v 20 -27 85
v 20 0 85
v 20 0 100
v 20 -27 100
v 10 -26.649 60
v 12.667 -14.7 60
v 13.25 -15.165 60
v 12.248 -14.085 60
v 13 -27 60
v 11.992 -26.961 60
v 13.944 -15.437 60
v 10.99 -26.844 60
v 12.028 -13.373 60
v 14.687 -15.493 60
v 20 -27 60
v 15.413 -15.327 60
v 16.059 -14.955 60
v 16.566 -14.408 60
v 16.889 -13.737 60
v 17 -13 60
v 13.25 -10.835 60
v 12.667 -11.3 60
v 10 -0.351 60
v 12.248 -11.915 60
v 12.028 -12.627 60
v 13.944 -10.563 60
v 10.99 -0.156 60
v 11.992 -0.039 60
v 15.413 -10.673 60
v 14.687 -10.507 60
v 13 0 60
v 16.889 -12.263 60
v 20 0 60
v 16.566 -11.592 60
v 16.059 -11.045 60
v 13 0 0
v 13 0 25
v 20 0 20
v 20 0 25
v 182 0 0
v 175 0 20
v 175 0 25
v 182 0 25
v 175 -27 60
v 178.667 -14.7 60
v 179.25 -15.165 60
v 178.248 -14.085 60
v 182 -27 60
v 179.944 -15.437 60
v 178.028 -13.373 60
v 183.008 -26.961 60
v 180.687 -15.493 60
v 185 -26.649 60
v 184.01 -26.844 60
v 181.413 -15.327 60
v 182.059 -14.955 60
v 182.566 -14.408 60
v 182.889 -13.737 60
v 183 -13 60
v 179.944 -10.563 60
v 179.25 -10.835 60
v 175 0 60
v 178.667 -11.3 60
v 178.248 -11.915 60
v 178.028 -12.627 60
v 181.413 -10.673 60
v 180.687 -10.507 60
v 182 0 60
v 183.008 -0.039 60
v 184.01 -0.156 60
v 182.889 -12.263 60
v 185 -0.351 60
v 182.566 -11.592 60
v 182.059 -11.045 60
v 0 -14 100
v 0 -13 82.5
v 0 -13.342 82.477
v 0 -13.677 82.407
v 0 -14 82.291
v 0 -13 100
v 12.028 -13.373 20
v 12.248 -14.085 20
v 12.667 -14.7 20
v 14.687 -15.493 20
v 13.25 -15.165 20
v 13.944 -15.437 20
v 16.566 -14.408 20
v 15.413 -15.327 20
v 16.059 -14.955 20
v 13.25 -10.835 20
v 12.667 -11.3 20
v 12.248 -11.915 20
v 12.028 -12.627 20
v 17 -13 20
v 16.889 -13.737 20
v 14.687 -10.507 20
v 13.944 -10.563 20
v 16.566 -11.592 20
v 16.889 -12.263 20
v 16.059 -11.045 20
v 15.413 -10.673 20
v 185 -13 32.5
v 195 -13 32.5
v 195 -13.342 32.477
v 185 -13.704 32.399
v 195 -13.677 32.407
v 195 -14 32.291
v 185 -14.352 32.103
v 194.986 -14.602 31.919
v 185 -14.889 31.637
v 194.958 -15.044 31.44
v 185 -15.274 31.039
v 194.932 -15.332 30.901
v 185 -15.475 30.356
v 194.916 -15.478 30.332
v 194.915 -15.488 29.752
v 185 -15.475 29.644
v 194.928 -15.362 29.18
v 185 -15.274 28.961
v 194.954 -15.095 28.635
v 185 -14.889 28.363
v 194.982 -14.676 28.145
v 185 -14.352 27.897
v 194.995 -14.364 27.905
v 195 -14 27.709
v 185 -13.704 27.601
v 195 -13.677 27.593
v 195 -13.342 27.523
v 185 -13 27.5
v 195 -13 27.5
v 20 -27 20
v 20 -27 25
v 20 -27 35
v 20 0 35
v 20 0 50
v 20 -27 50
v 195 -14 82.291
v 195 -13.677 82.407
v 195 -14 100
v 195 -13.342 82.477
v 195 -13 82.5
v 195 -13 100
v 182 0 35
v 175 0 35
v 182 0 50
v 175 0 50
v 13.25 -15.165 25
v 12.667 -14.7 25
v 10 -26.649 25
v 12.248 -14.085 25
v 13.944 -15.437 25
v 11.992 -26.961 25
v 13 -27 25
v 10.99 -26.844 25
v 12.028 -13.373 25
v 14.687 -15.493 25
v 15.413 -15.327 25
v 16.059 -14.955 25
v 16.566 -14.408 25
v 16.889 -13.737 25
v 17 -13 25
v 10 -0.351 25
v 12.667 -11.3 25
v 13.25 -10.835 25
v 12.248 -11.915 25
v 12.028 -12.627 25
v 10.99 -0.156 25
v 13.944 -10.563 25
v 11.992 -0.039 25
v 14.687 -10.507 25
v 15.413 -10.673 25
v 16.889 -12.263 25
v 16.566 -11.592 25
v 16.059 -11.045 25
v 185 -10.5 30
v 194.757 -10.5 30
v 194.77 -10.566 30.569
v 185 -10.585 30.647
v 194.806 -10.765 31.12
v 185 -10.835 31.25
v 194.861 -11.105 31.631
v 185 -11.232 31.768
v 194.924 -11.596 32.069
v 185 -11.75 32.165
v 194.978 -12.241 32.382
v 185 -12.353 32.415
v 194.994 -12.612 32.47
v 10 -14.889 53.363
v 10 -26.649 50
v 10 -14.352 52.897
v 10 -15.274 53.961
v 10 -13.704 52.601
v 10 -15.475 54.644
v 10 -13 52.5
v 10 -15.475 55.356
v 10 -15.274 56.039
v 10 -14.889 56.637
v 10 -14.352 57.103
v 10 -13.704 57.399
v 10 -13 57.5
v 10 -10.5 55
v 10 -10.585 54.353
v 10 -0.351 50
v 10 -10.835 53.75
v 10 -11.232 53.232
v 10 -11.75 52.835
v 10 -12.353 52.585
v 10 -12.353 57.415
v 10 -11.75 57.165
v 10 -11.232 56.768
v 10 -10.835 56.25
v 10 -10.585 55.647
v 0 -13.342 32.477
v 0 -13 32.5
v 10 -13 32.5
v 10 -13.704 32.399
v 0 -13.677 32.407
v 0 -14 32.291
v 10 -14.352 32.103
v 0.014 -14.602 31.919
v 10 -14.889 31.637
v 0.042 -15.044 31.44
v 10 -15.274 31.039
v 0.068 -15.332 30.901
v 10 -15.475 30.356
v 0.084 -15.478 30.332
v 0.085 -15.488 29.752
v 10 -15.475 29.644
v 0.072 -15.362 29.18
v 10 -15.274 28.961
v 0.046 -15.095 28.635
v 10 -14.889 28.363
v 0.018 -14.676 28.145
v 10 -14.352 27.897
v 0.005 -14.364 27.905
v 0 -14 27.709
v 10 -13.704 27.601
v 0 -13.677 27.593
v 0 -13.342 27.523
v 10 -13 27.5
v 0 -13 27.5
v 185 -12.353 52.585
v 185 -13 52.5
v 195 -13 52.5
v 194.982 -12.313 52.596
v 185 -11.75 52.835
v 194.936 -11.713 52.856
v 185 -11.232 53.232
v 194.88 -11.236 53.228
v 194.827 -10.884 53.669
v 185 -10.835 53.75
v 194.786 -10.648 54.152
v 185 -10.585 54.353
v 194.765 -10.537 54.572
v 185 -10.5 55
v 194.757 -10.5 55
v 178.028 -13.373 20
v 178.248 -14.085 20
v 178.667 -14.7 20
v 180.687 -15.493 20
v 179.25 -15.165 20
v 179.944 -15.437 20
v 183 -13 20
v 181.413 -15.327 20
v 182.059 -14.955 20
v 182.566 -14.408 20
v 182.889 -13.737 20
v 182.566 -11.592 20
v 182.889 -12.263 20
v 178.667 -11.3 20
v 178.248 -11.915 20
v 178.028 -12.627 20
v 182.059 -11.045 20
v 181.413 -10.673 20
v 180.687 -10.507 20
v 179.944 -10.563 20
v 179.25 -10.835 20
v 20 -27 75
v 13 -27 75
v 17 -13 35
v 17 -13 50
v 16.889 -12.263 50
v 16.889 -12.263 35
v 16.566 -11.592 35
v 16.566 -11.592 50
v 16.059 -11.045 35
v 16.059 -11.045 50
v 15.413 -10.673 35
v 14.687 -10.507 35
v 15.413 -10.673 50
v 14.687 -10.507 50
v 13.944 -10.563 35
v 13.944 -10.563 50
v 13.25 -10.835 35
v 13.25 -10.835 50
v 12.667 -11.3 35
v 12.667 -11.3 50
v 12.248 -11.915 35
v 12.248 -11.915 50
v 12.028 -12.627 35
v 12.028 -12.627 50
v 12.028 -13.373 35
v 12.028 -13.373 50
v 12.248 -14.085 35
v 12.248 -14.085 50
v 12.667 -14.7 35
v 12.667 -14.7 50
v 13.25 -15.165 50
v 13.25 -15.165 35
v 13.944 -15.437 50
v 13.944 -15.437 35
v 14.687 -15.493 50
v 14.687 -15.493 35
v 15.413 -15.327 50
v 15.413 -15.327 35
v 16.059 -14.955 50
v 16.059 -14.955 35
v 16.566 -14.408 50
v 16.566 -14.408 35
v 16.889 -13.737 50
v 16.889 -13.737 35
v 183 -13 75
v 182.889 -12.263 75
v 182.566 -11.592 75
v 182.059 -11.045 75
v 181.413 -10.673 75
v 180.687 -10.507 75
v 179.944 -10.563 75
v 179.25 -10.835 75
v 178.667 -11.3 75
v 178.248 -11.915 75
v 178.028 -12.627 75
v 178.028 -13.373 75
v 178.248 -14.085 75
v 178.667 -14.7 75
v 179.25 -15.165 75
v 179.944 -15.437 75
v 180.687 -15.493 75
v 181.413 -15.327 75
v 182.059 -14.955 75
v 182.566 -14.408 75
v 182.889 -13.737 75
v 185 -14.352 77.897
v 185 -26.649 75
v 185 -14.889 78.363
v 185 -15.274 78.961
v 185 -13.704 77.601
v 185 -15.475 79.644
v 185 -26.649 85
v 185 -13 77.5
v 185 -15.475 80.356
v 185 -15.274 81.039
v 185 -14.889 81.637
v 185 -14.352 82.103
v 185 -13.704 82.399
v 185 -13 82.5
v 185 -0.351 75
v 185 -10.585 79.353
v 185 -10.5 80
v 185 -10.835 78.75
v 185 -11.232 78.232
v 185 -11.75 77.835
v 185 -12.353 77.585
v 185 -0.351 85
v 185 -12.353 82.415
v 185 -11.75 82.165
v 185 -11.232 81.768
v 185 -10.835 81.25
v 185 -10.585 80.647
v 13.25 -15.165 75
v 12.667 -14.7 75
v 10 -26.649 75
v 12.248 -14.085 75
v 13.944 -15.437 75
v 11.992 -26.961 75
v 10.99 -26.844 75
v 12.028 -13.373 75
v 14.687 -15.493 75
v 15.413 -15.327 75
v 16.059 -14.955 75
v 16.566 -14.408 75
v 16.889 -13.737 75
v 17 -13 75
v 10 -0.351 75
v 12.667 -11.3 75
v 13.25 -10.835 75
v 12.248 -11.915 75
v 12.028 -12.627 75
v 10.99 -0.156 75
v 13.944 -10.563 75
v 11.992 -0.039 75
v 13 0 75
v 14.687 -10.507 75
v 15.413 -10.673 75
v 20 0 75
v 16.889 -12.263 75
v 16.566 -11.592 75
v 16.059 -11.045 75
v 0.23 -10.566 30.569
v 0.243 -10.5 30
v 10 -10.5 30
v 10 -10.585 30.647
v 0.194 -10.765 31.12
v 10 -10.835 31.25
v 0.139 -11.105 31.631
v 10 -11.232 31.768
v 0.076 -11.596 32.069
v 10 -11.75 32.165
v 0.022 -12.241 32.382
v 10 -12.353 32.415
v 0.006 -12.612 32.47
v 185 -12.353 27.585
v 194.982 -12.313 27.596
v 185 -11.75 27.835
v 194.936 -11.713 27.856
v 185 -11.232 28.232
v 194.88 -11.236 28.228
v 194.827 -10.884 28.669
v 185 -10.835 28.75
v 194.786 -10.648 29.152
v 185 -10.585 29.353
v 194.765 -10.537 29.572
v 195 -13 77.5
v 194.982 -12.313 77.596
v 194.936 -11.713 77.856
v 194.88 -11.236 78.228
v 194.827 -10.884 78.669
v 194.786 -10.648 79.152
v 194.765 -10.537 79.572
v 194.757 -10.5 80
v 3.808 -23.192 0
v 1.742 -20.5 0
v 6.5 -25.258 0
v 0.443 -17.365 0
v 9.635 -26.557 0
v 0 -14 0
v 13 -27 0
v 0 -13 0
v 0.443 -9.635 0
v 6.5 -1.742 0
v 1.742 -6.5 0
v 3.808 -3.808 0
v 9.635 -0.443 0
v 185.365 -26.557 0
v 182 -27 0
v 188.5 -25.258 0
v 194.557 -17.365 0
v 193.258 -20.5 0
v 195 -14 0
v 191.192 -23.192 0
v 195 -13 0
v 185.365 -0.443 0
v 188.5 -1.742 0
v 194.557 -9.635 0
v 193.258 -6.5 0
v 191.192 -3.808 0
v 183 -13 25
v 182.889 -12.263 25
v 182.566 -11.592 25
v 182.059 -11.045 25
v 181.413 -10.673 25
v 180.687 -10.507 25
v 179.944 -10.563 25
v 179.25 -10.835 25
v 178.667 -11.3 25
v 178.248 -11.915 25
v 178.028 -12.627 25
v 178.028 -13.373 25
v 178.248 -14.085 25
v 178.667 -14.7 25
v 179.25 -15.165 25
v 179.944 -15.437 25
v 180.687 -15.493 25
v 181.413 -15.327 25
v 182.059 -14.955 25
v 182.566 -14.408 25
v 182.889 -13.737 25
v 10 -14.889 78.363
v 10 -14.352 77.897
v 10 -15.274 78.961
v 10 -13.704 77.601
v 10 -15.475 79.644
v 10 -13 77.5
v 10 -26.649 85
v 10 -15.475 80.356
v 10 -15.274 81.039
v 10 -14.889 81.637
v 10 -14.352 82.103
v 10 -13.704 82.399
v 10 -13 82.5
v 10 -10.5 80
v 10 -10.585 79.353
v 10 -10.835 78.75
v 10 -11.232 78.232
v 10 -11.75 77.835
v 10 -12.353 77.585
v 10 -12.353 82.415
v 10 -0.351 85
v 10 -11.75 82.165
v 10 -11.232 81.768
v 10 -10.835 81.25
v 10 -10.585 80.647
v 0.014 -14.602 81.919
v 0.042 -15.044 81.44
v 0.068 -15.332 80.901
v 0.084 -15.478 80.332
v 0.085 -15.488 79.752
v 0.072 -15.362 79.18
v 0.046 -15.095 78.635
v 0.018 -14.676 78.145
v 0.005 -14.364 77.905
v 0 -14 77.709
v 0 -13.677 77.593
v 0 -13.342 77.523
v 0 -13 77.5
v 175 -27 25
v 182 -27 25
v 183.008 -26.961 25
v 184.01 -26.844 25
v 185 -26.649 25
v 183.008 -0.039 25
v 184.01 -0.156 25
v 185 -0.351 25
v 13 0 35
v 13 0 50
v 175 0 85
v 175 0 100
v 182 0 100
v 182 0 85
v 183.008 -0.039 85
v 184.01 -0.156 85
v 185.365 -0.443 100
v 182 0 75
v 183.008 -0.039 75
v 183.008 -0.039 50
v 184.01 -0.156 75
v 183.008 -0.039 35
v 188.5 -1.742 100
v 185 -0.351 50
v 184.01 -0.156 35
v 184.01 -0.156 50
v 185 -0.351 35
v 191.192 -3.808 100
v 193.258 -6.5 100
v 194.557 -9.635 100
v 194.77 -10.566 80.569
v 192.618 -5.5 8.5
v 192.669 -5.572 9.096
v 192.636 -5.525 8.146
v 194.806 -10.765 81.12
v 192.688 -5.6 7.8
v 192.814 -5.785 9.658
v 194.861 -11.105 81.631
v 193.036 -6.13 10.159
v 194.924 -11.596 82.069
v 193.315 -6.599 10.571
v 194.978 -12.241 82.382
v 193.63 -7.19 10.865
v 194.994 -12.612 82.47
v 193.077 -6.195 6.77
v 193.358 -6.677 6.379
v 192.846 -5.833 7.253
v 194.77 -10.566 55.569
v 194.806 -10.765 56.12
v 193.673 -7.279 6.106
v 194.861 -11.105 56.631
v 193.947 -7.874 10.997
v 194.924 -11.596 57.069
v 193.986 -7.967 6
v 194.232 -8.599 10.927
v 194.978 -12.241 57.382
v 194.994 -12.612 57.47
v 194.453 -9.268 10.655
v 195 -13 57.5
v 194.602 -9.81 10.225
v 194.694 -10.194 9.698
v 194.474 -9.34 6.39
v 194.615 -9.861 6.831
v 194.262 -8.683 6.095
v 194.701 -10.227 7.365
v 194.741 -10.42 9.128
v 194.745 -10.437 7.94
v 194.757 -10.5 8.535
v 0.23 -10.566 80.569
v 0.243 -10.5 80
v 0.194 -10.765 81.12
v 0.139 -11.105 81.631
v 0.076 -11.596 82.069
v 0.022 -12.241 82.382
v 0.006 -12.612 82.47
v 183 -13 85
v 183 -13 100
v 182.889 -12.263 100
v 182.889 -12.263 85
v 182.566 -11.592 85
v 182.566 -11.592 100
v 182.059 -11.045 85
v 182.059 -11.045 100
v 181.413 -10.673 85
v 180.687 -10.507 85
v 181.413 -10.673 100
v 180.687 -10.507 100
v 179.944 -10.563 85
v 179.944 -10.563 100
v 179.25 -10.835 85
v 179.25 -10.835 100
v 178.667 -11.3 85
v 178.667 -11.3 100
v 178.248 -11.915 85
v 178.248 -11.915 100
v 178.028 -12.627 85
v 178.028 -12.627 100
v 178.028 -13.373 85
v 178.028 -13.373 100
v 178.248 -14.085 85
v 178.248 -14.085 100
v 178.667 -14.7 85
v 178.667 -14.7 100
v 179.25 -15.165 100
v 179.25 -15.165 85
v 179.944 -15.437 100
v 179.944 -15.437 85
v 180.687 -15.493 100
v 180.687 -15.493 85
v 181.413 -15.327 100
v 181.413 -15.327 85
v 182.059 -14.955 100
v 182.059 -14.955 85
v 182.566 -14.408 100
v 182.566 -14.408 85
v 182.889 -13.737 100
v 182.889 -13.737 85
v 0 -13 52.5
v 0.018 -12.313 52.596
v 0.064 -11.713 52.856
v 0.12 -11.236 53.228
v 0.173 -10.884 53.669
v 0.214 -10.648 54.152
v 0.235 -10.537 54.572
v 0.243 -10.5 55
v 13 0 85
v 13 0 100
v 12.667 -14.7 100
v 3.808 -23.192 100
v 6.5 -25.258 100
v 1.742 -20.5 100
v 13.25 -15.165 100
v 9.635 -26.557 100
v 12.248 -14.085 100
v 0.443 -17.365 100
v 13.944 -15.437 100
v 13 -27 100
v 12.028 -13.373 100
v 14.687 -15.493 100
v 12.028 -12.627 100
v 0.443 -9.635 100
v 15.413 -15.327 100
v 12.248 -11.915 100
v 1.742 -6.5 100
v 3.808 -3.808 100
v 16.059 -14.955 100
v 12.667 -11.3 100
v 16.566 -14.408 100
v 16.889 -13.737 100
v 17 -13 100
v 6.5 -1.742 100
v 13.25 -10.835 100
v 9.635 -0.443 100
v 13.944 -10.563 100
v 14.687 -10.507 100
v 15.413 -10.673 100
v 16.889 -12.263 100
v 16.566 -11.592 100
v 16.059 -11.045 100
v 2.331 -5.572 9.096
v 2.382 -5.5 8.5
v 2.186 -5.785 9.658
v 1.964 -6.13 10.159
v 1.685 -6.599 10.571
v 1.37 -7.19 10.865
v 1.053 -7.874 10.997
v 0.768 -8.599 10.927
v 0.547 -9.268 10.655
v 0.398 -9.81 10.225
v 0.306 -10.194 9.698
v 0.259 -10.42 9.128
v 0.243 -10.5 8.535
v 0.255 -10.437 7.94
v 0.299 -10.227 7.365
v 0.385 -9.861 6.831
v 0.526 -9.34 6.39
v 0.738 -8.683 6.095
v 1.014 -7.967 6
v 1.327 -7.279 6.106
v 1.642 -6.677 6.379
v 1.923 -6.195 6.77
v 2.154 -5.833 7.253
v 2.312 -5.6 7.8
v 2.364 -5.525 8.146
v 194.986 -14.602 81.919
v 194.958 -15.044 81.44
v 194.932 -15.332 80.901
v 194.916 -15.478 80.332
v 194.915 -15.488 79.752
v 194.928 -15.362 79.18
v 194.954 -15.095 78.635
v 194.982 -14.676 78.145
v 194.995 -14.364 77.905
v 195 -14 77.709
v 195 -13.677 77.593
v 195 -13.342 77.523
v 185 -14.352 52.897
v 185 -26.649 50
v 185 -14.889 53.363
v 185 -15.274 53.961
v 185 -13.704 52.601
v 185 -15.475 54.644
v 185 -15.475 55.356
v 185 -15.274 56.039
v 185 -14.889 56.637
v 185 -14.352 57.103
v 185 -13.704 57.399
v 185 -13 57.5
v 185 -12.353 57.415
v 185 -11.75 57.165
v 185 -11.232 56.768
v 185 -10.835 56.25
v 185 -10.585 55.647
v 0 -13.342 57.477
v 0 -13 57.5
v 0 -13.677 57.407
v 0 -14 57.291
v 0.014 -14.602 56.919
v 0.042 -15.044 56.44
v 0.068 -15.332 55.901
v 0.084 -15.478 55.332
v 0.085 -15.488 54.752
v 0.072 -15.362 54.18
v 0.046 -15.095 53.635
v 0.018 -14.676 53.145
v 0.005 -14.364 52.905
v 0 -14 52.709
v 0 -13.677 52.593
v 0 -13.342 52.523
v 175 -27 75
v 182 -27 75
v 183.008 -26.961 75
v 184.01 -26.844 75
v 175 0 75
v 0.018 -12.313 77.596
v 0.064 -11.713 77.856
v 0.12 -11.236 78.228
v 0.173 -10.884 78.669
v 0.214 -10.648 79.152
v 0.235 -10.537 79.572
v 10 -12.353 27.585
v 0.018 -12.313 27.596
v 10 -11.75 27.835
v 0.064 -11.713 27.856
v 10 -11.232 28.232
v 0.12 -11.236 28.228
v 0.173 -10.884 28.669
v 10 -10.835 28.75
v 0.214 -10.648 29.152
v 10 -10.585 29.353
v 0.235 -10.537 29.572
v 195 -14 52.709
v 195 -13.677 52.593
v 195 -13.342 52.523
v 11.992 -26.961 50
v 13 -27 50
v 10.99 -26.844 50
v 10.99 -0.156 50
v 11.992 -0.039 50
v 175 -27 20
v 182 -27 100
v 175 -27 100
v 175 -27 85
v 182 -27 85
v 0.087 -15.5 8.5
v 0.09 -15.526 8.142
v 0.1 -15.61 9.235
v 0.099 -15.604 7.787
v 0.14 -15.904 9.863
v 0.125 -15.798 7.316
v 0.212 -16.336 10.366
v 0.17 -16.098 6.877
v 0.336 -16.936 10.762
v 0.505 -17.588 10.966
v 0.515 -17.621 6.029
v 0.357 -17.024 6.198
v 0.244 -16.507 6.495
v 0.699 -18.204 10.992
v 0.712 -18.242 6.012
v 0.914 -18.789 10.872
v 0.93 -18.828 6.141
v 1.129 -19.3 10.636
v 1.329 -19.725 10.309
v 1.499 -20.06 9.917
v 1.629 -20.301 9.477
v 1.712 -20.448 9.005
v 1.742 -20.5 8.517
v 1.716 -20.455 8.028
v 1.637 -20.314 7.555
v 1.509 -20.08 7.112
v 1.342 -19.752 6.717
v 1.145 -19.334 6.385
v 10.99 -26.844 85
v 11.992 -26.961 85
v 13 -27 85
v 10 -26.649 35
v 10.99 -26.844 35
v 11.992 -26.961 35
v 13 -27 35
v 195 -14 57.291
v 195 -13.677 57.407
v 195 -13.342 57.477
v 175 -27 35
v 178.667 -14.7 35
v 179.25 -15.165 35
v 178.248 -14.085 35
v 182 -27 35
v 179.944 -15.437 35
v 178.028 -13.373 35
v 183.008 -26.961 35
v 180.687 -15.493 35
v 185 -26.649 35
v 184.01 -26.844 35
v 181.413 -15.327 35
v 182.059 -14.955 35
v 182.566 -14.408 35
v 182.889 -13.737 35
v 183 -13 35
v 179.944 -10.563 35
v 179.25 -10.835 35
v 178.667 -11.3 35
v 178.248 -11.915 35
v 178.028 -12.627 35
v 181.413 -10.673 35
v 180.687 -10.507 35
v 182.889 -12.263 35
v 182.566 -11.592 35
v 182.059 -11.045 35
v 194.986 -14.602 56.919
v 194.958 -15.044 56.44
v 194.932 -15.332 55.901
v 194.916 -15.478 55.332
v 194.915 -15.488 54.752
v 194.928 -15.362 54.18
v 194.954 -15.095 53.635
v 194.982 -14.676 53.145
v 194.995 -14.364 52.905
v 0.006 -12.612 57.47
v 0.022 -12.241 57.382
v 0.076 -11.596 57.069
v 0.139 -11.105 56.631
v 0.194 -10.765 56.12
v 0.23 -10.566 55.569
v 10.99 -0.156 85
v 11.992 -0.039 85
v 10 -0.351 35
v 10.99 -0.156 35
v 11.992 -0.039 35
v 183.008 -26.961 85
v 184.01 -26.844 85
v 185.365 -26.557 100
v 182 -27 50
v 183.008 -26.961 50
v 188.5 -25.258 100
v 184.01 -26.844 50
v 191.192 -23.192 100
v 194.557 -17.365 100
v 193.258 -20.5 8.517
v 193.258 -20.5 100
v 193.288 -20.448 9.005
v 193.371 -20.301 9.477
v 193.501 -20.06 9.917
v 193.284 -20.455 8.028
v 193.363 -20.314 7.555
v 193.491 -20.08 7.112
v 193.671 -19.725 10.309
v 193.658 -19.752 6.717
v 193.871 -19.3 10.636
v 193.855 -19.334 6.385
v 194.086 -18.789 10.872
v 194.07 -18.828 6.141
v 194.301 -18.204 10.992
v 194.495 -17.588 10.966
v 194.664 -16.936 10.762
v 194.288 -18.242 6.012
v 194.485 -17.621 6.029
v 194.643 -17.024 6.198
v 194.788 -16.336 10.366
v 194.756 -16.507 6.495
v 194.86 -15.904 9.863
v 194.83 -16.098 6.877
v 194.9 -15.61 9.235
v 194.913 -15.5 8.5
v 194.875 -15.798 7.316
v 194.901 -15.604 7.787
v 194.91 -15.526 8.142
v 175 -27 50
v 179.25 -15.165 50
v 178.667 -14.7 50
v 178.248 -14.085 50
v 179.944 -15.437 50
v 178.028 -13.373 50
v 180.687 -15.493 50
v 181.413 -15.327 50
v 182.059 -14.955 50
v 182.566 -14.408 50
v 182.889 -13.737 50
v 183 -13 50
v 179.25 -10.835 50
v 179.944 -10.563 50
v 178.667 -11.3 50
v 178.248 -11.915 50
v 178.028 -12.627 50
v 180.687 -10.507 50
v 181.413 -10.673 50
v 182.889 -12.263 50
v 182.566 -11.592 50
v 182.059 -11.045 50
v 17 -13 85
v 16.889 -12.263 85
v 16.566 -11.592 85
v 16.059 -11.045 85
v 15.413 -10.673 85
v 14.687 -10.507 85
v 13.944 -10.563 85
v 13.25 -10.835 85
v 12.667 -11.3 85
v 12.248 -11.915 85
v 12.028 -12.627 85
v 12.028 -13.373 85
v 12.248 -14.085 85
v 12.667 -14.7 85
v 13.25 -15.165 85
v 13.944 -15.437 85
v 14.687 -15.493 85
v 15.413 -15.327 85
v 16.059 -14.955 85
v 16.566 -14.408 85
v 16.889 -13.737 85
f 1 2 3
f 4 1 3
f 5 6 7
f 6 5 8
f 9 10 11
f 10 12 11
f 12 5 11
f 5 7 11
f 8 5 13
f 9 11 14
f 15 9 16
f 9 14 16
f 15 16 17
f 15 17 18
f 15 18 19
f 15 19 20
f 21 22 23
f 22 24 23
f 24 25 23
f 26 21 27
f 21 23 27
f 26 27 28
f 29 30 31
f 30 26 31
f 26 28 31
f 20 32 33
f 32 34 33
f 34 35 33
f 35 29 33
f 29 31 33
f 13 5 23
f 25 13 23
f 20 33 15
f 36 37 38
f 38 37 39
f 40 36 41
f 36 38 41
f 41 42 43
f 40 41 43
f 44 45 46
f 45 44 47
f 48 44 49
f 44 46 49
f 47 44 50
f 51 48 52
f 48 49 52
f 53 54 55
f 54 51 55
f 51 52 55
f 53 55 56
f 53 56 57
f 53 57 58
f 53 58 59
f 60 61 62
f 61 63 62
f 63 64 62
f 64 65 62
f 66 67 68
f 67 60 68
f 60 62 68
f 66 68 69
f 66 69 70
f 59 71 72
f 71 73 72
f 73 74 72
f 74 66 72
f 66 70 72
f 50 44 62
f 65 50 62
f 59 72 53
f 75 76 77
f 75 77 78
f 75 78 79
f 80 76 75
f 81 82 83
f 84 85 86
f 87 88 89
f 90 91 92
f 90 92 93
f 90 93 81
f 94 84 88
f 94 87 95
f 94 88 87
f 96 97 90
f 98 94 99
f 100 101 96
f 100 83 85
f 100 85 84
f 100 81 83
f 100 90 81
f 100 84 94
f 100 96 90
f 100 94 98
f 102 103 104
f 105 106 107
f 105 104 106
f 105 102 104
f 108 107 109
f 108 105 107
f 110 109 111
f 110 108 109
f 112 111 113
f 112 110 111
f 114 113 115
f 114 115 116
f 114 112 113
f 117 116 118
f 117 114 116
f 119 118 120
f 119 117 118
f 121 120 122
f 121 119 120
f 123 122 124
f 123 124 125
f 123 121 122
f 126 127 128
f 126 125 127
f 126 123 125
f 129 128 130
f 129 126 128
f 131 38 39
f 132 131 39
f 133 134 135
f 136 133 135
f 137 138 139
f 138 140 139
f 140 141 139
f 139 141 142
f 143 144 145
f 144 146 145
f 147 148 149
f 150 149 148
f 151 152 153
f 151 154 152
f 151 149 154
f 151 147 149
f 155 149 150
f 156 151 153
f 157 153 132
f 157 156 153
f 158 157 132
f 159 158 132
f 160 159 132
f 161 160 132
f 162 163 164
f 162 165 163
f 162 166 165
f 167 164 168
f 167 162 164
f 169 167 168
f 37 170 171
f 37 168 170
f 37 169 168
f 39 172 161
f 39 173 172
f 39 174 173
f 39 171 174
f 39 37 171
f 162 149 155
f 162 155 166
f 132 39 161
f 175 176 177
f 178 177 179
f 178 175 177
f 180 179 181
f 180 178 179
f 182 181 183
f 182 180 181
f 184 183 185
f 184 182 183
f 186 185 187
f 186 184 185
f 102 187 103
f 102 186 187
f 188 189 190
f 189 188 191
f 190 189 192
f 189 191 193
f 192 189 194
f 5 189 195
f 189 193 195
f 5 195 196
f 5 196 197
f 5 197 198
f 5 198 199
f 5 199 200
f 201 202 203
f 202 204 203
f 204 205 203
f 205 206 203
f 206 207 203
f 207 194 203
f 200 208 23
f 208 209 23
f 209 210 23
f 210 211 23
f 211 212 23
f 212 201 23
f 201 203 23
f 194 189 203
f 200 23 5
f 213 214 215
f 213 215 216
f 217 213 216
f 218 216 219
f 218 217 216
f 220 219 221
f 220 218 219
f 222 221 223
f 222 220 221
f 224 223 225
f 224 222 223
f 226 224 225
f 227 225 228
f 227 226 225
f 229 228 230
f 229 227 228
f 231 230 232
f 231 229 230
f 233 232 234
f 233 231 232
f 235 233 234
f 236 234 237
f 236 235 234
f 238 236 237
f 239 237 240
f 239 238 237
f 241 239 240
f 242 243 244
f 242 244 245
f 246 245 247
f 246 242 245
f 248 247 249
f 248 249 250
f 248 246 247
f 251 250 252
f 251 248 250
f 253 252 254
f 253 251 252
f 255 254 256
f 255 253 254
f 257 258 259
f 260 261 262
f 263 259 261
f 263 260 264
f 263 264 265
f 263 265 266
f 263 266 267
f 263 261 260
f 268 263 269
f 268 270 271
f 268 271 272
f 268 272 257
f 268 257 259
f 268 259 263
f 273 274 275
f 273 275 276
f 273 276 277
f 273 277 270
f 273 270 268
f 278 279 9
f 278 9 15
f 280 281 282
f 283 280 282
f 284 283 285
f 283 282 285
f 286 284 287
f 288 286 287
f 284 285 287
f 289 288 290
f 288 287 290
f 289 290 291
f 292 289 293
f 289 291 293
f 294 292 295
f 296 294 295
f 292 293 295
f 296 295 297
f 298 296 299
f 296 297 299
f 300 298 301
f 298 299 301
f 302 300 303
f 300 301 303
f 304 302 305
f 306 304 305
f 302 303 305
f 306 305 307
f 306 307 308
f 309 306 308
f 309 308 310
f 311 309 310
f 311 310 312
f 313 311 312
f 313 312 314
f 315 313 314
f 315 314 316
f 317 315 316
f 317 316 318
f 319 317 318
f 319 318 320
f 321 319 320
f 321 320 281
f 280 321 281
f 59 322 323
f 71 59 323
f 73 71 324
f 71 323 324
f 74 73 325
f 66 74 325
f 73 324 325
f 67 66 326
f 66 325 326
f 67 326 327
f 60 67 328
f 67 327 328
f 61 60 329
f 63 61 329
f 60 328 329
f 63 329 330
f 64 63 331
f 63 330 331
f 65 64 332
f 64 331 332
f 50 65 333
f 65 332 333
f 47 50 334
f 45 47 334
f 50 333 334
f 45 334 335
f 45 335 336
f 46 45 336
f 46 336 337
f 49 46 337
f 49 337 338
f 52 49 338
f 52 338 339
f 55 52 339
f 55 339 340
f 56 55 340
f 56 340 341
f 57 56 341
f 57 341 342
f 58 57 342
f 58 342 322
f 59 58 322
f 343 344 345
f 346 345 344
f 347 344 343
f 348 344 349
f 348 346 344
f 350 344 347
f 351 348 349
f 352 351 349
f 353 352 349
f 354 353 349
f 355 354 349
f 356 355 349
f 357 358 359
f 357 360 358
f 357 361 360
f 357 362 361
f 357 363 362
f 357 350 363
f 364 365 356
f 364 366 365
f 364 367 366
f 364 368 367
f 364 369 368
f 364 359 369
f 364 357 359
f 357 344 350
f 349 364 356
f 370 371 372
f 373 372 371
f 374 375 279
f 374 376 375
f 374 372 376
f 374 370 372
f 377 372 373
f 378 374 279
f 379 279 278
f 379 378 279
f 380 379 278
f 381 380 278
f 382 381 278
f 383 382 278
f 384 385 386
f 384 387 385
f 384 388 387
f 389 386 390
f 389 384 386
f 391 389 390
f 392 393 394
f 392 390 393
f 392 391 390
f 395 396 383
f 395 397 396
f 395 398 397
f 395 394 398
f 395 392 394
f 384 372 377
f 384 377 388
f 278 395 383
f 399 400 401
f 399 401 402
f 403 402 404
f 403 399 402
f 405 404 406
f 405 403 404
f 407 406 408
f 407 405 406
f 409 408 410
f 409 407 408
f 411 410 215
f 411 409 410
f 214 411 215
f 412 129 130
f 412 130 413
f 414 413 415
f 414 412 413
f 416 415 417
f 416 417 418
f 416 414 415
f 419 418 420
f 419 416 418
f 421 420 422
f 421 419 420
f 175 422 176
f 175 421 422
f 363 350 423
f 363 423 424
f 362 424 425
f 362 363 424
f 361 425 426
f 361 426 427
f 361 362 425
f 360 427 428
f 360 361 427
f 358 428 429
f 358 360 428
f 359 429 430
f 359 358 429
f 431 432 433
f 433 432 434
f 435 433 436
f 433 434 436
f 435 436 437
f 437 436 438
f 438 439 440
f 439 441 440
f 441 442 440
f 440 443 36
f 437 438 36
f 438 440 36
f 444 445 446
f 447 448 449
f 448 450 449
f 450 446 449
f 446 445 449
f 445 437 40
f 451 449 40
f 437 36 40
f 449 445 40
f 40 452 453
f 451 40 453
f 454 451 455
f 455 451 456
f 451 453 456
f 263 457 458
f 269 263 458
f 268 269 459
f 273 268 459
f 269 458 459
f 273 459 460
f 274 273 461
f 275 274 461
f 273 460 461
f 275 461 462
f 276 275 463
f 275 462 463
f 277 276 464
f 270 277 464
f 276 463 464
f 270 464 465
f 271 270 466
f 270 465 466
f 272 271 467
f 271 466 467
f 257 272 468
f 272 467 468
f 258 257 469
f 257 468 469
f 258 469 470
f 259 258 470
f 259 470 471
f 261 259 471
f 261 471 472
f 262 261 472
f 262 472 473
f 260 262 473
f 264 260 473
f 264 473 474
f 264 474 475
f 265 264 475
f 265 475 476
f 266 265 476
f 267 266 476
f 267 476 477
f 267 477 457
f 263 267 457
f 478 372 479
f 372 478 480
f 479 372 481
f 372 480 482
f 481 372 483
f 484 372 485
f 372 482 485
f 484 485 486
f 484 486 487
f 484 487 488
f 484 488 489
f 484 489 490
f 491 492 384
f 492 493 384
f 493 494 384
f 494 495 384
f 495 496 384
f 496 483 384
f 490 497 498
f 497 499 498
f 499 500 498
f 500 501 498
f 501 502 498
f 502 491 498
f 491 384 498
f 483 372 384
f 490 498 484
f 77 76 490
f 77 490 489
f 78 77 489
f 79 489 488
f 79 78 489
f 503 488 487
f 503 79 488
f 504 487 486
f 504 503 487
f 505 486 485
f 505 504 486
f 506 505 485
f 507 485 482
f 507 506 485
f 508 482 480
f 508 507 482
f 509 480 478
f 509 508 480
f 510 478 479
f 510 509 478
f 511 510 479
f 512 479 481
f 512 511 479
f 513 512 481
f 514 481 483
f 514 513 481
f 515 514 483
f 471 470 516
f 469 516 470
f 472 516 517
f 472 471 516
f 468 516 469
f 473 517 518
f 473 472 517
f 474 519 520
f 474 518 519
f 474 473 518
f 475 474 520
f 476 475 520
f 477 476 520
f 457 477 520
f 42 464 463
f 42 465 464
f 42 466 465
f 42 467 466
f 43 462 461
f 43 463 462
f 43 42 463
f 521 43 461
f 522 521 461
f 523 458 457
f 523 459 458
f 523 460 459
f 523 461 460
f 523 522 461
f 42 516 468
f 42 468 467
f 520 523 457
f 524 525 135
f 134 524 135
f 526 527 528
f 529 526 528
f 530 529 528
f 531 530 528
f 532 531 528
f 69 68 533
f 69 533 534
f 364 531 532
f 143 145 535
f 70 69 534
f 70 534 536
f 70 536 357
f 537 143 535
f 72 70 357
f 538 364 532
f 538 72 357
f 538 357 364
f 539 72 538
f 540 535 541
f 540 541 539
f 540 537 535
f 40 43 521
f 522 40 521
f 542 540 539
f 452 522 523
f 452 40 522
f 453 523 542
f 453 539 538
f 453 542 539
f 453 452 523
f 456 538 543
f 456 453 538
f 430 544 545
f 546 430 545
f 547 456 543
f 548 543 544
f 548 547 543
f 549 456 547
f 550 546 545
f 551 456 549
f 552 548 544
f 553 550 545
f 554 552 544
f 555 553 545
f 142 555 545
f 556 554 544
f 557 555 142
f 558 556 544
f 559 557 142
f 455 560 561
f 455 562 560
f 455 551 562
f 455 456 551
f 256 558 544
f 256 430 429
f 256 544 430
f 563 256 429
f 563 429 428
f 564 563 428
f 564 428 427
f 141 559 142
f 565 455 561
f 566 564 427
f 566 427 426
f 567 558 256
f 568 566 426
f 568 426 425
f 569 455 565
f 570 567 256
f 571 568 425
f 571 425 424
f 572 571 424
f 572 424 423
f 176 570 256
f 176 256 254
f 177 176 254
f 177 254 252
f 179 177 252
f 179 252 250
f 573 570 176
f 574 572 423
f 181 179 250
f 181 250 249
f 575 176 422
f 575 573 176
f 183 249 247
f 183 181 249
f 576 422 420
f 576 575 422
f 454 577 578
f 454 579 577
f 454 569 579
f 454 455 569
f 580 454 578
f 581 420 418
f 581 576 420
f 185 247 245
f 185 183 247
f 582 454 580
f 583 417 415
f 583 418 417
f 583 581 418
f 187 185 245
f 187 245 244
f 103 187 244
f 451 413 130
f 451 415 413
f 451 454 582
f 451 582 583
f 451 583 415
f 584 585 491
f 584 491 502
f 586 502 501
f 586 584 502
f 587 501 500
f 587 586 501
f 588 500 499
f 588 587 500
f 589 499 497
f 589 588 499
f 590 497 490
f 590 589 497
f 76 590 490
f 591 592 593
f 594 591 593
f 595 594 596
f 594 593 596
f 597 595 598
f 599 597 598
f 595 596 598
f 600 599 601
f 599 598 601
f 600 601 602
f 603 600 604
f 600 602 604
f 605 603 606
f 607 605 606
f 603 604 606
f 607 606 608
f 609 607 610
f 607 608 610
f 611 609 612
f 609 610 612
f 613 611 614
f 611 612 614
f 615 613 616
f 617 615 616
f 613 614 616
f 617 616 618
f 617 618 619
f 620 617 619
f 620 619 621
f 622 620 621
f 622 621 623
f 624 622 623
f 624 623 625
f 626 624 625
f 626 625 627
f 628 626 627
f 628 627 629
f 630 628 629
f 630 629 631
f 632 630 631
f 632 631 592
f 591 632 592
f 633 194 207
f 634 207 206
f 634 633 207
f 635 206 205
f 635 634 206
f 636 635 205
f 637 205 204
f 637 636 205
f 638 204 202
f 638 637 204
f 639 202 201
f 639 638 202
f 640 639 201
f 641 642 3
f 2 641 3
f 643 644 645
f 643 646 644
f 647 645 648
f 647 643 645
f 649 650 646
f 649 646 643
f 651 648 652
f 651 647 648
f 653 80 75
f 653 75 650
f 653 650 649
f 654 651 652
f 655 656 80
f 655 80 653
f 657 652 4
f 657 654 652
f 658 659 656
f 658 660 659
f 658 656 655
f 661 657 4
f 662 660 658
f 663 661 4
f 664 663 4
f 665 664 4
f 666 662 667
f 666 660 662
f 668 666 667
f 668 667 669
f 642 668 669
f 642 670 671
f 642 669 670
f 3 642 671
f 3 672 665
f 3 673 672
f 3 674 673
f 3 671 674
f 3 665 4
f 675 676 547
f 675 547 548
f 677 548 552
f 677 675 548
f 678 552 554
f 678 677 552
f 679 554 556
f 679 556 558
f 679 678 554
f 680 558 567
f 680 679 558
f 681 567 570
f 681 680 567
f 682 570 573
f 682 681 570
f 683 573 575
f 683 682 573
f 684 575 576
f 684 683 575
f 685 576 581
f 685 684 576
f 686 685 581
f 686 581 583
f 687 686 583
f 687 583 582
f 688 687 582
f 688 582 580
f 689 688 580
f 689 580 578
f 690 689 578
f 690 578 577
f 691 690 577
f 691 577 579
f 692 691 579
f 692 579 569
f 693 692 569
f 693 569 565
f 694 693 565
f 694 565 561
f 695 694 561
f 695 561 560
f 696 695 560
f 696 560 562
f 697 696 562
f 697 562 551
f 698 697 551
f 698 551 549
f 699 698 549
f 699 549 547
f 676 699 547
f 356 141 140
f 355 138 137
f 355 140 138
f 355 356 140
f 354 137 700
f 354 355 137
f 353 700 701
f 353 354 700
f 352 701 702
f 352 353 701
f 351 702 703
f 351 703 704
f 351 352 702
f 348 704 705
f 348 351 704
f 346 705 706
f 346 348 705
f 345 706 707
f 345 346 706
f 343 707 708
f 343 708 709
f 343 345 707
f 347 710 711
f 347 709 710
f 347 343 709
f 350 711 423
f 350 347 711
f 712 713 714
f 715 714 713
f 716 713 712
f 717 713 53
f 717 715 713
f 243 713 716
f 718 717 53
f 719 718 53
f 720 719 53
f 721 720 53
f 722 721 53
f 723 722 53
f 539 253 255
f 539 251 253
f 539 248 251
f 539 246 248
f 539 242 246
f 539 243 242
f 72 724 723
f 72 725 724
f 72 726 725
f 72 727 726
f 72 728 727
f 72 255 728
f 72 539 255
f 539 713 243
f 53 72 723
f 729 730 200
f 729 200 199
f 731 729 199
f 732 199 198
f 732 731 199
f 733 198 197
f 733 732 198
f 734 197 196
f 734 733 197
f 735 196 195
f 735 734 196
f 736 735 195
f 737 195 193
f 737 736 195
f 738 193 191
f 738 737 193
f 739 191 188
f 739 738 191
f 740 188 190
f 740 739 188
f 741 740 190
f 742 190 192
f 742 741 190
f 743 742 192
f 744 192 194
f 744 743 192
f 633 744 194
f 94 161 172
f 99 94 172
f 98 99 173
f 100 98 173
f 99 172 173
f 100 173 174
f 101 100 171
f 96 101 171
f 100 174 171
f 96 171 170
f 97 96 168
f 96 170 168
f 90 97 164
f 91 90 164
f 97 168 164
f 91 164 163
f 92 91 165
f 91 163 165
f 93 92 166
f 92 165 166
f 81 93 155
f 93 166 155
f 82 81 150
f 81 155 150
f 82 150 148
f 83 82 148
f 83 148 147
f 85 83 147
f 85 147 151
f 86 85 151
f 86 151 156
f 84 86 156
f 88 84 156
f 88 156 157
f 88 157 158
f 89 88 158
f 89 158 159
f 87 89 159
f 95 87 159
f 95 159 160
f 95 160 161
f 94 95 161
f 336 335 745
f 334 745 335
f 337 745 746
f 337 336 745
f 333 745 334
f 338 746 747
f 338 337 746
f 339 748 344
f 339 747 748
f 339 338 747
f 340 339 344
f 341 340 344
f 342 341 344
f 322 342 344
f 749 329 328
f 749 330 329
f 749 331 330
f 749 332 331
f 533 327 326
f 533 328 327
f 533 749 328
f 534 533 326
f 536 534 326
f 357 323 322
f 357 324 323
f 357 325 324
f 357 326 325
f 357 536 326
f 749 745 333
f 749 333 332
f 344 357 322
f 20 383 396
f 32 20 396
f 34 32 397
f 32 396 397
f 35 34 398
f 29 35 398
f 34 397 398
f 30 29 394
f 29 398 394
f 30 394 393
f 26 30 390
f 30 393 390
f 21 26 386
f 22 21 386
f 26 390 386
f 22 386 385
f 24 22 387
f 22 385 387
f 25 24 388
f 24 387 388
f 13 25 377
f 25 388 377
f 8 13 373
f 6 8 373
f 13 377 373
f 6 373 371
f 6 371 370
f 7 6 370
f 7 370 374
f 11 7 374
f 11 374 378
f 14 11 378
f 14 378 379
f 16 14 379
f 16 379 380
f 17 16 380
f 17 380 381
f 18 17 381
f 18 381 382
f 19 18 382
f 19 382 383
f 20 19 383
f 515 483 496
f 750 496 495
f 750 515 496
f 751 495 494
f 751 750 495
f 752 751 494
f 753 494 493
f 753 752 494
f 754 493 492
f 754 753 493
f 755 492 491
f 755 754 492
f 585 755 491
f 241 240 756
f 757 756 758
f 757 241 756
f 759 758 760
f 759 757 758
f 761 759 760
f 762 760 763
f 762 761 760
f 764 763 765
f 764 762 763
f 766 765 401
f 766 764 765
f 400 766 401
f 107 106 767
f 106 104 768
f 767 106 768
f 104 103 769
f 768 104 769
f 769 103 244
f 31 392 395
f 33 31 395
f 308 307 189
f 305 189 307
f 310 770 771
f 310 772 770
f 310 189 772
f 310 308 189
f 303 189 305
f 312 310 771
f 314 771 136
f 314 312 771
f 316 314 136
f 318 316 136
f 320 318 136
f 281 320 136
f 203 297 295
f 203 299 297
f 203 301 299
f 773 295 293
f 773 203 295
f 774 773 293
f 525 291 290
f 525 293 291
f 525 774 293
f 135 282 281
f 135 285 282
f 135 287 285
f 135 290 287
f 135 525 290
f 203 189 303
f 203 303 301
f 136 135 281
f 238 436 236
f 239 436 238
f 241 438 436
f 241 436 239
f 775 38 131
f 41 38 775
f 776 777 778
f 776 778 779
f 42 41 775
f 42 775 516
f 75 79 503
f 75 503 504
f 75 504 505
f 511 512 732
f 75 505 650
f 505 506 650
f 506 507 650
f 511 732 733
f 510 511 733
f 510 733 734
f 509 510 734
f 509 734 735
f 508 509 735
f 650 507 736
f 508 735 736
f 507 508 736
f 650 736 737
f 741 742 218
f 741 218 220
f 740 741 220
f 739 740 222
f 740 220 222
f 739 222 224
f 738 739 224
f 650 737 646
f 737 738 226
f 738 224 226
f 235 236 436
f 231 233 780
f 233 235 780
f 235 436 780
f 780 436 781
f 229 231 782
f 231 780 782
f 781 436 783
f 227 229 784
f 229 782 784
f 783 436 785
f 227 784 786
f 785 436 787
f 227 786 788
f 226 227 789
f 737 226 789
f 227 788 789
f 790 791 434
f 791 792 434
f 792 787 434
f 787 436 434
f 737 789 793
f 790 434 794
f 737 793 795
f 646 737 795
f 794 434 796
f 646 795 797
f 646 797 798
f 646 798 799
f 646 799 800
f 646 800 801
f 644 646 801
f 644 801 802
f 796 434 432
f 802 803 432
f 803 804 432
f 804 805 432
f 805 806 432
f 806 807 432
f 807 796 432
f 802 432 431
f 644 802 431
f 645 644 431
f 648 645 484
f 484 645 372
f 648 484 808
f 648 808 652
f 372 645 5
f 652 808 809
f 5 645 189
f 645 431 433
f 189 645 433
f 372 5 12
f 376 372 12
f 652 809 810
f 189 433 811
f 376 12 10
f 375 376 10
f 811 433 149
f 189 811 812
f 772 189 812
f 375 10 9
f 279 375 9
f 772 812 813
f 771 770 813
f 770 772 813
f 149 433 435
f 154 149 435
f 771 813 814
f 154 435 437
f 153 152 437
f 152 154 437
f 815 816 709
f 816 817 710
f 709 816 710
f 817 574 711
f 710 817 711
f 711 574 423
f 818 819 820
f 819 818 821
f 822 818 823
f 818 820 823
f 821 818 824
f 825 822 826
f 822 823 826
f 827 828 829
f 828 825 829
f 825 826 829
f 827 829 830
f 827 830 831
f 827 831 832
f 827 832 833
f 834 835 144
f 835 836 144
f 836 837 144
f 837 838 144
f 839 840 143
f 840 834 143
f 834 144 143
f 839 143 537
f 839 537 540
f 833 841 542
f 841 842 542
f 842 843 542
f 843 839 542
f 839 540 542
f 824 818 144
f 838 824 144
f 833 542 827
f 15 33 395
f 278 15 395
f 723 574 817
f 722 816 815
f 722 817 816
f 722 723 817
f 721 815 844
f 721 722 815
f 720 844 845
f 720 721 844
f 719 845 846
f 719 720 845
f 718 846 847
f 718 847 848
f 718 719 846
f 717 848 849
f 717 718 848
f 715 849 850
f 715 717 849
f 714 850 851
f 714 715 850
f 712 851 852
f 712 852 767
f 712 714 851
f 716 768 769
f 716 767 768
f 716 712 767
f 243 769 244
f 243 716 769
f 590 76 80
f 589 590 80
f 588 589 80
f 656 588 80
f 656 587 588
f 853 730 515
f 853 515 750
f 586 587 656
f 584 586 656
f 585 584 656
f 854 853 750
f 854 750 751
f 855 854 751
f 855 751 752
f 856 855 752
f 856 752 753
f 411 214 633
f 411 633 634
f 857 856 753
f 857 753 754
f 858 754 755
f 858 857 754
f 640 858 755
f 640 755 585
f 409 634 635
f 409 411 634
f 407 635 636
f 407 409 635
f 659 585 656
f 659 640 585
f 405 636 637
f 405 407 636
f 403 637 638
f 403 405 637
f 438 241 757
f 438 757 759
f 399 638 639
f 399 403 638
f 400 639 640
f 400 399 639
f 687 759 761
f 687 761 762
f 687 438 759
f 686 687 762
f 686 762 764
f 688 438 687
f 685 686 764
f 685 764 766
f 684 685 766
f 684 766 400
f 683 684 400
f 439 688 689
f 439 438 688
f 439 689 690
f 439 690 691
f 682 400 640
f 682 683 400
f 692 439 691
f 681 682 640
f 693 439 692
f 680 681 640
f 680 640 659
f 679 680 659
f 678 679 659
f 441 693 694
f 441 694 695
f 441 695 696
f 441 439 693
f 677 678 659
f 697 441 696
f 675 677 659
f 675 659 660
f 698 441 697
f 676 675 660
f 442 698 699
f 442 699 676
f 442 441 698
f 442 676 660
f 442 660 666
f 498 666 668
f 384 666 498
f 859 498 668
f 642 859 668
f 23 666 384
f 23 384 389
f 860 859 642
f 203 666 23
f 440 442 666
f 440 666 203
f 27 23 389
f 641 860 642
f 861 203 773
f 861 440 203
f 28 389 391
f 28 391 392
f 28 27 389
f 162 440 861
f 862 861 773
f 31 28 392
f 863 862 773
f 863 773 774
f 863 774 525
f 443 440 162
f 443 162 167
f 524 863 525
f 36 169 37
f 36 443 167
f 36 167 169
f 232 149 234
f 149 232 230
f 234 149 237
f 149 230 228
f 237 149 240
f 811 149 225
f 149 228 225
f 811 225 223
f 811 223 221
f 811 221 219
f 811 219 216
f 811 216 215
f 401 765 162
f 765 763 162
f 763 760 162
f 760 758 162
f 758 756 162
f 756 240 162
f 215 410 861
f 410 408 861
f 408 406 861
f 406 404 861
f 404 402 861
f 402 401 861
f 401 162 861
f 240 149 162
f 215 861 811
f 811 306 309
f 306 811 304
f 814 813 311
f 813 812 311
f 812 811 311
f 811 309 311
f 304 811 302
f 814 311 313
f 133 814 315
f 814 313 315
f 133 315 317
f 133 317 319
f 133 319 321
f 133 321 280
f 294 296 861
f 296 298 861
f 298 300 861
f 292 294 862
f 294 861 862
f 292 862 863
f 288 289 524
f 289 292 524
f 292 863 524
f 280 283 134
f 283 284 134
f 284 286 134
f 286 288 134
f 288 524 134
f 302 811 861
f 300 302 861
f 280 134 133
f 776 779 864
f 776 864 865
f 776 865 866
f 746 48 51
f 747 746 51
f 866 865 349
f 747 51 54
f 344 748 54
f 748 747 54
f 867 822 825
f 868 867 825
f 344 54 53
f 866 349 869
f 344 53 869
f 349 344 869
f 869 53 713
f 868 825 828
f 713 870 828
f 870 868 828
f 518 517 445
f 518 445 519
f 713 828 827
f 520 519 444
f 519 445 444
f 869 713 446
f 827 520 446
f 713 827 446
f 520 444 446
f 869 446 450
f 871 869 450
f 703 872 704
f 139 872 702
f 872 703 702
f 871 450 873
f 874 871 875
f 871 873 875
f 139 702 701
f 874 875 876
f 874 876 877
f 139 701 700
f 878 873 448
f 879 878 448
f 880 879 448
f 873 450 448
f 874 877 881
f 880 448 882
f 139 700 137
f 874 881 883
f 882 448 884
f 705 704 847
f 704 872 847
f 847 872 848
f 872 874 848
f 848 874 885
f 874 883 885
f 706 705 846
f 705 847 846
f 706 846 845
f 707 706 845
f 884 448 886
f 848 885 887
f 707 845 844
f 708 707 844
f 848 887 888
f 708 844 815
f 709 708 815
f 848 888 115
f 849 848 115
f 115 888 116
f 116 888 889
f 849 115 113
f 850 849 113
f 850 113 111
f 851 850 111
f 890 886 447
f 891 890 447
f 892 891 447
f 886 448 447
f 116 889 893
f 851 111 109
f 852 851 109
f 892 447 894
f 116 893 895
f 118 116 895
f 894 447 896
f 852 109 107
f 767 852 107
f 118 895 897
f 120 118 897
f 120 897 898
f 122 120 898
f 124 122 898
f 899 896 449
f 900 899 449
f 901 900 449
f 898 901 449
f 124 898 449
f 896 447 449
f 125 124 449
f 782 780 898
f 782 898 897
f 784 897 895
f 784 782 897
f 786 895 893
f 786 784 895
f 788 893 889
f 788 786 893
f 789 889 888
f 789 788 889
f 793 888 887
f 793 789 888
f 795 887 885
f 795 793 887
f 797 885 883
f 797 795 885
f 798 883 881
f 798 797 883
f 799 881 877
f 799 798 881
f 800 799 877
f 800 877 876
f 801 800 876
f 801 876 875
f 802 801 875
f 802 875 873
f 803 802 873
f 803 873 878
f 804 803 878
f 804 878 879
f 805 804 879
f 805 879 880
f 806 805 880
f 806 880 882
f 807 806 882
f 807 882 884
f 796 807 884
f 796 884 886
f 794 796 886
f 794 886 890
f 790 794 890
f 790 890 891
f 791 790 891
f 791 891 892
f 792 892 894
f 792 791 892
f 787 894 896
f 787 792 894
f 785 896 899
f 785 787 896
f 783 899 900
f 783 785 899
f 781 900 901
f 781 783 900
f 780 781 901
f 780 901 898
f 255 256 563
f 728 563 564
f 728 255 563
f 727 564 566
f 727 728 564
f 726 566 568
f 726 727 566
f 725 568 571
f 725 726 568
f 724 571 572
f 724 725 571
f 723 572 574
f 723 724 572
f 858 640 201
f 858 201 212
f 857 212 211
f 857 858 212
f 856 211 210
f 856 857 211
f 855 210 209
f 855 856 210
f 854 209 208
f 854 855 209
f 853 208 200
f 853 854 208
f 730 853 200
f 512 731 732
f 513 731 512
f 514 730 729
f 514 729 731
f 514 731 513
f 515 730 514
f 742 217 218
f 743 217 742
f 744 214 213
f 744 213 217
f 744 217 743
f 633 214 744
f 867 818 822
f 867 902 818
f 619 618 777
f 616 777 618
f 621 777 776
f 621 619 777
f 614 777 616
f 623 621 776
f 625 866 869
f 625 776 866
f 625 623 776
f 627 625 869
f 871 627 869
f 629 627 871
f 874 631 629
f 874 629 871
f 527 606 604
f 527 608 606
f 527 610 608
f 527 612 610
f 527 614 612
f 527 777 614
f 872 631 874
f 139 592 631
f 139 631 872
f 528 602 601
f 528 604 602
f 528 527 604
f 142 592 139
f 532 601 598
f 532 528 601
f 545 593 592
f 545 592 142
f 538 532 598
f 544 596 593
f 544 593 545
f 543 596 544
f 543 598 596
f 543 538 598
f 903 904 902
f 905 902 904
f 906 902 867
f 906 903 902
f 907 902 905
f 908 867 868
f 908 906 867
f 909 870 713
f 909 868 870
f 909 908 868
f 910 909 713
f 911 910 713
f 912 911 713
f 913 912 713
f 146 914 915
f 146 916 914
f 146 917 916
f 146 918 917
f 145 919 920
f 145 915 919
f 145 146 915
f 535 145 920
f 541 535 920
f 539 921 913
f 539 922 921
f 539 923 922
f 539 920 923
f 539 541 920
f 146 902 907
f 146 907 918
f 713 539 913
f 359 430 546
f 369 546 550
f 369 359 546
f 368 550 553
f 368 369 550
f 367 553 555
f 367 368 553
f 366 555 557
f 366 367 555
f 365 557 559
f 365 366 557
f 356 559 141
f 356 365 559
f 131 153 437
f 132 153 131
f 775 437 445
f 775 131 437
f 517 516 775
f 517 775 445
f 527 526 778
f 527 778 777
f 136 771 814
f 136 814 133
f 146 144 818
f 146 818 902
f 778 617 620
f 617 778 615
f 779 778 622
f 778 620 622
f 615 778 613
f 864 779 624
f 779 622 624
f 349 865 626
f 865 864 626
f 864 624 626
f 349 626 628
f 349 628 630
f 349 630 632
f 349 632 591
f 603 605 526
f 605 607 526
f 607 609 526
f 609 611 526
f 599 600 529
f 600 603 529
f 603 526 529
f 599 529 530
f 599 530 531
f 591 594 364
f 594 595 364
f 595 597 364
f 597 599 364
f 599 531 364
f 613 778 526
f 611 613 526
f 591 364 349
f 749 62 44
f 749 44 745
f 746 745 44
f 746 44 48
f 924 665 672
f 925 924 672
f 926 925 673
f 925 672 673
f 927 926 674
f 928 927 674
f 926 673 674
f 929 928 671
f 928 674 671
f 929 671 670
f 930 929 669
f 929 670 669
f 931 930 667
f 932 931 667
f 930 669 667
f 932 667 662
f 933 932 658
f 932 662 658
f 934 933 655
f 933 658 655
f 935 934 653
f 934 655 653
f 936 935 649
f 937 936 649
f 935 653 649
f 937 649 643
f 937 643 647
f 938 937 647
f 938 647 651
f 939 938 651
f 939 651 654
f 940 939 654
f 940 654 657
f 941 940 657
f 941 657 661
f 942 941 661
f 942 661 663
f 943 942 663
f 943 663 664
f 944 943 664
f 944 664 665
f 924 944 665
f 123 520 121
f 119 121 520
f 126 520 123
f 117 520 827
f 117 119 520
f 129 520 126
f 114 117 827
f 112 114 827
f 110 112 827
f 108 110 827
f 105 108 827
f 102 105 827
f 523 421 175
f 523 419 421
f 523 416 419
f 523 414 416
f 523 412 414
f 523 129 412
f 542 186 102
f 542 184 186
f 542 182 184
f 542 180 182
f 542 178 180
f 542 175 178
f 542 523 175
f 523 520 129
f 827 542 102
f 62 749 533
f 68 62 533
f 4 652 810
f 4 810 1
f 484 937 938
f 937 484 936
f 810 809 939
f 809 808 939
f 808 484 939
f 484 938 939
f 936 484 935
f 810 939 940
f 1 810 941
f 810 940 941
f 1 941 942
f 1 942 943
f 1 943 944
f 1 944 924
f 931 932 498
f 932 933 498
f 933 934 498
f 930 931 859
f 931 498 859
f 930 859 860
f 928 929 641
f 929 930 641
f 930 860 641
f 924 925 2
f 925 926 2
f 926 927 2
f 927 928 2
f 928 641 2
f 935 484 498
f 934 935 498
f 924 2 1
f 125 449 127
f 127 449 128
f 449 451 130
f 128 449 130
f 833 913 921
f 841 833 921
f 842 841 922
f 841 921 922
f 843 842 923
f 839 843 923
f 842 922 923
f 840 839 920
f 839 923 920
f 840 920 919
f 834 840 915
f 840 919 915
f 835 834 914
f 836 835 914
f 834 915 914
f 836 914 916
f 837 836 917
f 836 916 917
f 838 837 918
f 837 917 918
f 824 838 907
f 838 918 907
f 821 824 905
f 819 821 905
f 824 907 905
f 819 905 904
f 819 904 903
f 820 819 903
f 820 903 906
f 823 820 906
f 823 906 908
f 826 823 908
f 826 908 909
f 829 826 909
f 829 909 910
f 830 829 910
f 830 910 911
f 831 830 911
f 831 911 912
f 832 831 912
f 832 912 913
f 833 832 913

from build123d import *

# Parameters (mm, degrees)
F0_W         = 195
F0_H         = 100
F1_DEPTH     = 27
F2_W         = 155
F2_H         = 80
F3_DEPTH     = 27.001
F4_W         = 10
F4_H         = 10
F5_DEPTH     = 27.001
F6_R         = 2.5
F7_DEPTH     = 80
F9_DEPTH     = 195.001
F10_R        = 2.5
F11_DEPTH    = 195.001
F12_T1_DEPTH = 165


# Not quite as in the source:
# - a fillet or chamfer that OpenCascade refuses, or shapes differently, is made with other operations: its cross-section is extruded or revolved along the edge and cut away or added


with BuildPart() as f1:
    # F0 (on Front) → F1 (new body)
    with BuildSketch(Plane.XZ):
        with Locations((97.5, 50)):
            Rectangle(F0_W, F0_H)
    extrude(amount=F1_DEPTH)

    # F2 (on Front) → F3 (cut, through all)
    with BuildSketch(Plane.XZ):
        with Locations((97.5, 60)):
            Rectangle(F2_W, F2_H)
    extrude(amount=F3_DEPTH, mode=Mode.SUBTRACT)

    # F4 (on Front) → F5 (cut, through all)
    with BuildSketch(Plane.XZ):
        with Locations((180, 80)):
            Rectangle(F4_W, F4_H)
        with Locations((180, 55)):
            Rectangle(F4_W, F4_H)
        with Locations((180, 30)):
            Rectangle(F4_W, F4_H)
        with Locations((15, 30)):
            Rectangle(F4_W, F4_H)
        with Locations((15, 55)):
            Rectangle(F4_W, F4_H)
        with Locations((15, 80)):
            Rectangle(F4_W, F4_H)
    extrude(amount=F5_DEPTH, mode=Mode.SUBTRACT)

    # F6 (on face) → F7 (cut)
    with BuildSketch(Plane.XY.offset(100)):
        with Locations((180.5, -13)):
            Circle(F6_R)
        with Locations((14.5, -13)):
            Circle(F6_R)
    extrude(amount=-F7_DEPTH, mode=Mode.SUBTRACT)

    # F8 (on Right) → F9 (cut, through all)
    with BuildSketch(Plane.YZ):
        with BuildLine():
            Line((-13, 77.5), (-13, 82.5))
            ThreePointArc((-13, 82.5), (-15.5, 80), (-13, 77.5))
        make_face()
        with BuildLine():
            ThreePointArc((-13, 77.5), (-11.232233047, 78.232233047), (-10.5, 80))
            ThreePointArc((-10.5, 80), (-11.232233047, 81.767766953), (-13, 82.5))
            Line((-13, 82.5), (-13, 77.5))
        make_face()
        with BuildLine():
            Line((-13, 52.5), (-13, 57.5))
            ThreePointArc((-13, 57.5), (-15.5, 55), (-13, 52.5))
        make_face()
        with BuildLine():
            ThreePointArc((-10.5, 55), (-11.232233047, 56.767766953), (-13, 57.5))
            Line((-13, 57.5), (-13, 52.5))
            ThreePointArc((-13, 52.5), (-11.232233047, 53.232233047), (-10.5, 55))
        make_face()
        with BuildLine():
            Line((-13, 27.5), (-13, 32.5))
            ThreePointArc((-13, 32.5), (-15.5, 30), (-13, 27.5))
        make_face()
        with BuildLine():
            ThreePointArc((-10.5, 30), (-11.232233047, 31.767766953), (-13, 32.5))
            Line((-13, 32.5), (-13, 27.5))
            ThreePointArc((-13, 27.5), (-11.232233047, 28.232233047), (-10.5, 30))
        make_face()
    extrude(amount=F9_DEPTH, mode=Mode.SUBTRACT)

    # F10 (on Right) → F11 (cut, through all)
    with BuildSketch(Plane.YZ):
        with Locations((-8, 8.5)):
            Circle(F10_R)
        with Locations((-18, 8.5)):
            Circle(F10_R)
    extrude(amount=F11_DEPTH, mode=Mode.SUBTRACT)

    # F12: fillet of radius 13 on 4 edges, made by hand

    # F12_s2 → F12_t1 (cut)
    with BuildSketch(Plane.XY.offset(-32.5)):
        with BuildLine():
            ThreePointArc((0, -13), (3.8076118446, -3.8076118446), (13, 0))
            Line((13, 0), (0, 0))
            Line((0, 0), (0, -13))
        make_face()
        with BuildLine():
            ThreePointArc((0, -14), (3.8076118446, -23.1923881554), (13, -27))
            Line((13, -27), (0, -27))
            Line((0, -27), (0, -14))
        make_face()
        with BuildLine():
            ThreePointArc((182, -27), (191.1923881554, -23.1923881554), (195, -14))
            Line((195, -14), (195, -27))
            Line((195, -27), (182, -27))
        make_face()
        with BuildLine():
            ThreePointArc((182, 0), (191.1923881554, -3.8076118446), (195, -13))
            Line((195, -13), (195, 0))
            Line((195, 0), (182, 0))
        make_face()
    extrude(amount=F12_T1_DEPTH, mode=Mode.SUBTRACT)


solid = f1.part
